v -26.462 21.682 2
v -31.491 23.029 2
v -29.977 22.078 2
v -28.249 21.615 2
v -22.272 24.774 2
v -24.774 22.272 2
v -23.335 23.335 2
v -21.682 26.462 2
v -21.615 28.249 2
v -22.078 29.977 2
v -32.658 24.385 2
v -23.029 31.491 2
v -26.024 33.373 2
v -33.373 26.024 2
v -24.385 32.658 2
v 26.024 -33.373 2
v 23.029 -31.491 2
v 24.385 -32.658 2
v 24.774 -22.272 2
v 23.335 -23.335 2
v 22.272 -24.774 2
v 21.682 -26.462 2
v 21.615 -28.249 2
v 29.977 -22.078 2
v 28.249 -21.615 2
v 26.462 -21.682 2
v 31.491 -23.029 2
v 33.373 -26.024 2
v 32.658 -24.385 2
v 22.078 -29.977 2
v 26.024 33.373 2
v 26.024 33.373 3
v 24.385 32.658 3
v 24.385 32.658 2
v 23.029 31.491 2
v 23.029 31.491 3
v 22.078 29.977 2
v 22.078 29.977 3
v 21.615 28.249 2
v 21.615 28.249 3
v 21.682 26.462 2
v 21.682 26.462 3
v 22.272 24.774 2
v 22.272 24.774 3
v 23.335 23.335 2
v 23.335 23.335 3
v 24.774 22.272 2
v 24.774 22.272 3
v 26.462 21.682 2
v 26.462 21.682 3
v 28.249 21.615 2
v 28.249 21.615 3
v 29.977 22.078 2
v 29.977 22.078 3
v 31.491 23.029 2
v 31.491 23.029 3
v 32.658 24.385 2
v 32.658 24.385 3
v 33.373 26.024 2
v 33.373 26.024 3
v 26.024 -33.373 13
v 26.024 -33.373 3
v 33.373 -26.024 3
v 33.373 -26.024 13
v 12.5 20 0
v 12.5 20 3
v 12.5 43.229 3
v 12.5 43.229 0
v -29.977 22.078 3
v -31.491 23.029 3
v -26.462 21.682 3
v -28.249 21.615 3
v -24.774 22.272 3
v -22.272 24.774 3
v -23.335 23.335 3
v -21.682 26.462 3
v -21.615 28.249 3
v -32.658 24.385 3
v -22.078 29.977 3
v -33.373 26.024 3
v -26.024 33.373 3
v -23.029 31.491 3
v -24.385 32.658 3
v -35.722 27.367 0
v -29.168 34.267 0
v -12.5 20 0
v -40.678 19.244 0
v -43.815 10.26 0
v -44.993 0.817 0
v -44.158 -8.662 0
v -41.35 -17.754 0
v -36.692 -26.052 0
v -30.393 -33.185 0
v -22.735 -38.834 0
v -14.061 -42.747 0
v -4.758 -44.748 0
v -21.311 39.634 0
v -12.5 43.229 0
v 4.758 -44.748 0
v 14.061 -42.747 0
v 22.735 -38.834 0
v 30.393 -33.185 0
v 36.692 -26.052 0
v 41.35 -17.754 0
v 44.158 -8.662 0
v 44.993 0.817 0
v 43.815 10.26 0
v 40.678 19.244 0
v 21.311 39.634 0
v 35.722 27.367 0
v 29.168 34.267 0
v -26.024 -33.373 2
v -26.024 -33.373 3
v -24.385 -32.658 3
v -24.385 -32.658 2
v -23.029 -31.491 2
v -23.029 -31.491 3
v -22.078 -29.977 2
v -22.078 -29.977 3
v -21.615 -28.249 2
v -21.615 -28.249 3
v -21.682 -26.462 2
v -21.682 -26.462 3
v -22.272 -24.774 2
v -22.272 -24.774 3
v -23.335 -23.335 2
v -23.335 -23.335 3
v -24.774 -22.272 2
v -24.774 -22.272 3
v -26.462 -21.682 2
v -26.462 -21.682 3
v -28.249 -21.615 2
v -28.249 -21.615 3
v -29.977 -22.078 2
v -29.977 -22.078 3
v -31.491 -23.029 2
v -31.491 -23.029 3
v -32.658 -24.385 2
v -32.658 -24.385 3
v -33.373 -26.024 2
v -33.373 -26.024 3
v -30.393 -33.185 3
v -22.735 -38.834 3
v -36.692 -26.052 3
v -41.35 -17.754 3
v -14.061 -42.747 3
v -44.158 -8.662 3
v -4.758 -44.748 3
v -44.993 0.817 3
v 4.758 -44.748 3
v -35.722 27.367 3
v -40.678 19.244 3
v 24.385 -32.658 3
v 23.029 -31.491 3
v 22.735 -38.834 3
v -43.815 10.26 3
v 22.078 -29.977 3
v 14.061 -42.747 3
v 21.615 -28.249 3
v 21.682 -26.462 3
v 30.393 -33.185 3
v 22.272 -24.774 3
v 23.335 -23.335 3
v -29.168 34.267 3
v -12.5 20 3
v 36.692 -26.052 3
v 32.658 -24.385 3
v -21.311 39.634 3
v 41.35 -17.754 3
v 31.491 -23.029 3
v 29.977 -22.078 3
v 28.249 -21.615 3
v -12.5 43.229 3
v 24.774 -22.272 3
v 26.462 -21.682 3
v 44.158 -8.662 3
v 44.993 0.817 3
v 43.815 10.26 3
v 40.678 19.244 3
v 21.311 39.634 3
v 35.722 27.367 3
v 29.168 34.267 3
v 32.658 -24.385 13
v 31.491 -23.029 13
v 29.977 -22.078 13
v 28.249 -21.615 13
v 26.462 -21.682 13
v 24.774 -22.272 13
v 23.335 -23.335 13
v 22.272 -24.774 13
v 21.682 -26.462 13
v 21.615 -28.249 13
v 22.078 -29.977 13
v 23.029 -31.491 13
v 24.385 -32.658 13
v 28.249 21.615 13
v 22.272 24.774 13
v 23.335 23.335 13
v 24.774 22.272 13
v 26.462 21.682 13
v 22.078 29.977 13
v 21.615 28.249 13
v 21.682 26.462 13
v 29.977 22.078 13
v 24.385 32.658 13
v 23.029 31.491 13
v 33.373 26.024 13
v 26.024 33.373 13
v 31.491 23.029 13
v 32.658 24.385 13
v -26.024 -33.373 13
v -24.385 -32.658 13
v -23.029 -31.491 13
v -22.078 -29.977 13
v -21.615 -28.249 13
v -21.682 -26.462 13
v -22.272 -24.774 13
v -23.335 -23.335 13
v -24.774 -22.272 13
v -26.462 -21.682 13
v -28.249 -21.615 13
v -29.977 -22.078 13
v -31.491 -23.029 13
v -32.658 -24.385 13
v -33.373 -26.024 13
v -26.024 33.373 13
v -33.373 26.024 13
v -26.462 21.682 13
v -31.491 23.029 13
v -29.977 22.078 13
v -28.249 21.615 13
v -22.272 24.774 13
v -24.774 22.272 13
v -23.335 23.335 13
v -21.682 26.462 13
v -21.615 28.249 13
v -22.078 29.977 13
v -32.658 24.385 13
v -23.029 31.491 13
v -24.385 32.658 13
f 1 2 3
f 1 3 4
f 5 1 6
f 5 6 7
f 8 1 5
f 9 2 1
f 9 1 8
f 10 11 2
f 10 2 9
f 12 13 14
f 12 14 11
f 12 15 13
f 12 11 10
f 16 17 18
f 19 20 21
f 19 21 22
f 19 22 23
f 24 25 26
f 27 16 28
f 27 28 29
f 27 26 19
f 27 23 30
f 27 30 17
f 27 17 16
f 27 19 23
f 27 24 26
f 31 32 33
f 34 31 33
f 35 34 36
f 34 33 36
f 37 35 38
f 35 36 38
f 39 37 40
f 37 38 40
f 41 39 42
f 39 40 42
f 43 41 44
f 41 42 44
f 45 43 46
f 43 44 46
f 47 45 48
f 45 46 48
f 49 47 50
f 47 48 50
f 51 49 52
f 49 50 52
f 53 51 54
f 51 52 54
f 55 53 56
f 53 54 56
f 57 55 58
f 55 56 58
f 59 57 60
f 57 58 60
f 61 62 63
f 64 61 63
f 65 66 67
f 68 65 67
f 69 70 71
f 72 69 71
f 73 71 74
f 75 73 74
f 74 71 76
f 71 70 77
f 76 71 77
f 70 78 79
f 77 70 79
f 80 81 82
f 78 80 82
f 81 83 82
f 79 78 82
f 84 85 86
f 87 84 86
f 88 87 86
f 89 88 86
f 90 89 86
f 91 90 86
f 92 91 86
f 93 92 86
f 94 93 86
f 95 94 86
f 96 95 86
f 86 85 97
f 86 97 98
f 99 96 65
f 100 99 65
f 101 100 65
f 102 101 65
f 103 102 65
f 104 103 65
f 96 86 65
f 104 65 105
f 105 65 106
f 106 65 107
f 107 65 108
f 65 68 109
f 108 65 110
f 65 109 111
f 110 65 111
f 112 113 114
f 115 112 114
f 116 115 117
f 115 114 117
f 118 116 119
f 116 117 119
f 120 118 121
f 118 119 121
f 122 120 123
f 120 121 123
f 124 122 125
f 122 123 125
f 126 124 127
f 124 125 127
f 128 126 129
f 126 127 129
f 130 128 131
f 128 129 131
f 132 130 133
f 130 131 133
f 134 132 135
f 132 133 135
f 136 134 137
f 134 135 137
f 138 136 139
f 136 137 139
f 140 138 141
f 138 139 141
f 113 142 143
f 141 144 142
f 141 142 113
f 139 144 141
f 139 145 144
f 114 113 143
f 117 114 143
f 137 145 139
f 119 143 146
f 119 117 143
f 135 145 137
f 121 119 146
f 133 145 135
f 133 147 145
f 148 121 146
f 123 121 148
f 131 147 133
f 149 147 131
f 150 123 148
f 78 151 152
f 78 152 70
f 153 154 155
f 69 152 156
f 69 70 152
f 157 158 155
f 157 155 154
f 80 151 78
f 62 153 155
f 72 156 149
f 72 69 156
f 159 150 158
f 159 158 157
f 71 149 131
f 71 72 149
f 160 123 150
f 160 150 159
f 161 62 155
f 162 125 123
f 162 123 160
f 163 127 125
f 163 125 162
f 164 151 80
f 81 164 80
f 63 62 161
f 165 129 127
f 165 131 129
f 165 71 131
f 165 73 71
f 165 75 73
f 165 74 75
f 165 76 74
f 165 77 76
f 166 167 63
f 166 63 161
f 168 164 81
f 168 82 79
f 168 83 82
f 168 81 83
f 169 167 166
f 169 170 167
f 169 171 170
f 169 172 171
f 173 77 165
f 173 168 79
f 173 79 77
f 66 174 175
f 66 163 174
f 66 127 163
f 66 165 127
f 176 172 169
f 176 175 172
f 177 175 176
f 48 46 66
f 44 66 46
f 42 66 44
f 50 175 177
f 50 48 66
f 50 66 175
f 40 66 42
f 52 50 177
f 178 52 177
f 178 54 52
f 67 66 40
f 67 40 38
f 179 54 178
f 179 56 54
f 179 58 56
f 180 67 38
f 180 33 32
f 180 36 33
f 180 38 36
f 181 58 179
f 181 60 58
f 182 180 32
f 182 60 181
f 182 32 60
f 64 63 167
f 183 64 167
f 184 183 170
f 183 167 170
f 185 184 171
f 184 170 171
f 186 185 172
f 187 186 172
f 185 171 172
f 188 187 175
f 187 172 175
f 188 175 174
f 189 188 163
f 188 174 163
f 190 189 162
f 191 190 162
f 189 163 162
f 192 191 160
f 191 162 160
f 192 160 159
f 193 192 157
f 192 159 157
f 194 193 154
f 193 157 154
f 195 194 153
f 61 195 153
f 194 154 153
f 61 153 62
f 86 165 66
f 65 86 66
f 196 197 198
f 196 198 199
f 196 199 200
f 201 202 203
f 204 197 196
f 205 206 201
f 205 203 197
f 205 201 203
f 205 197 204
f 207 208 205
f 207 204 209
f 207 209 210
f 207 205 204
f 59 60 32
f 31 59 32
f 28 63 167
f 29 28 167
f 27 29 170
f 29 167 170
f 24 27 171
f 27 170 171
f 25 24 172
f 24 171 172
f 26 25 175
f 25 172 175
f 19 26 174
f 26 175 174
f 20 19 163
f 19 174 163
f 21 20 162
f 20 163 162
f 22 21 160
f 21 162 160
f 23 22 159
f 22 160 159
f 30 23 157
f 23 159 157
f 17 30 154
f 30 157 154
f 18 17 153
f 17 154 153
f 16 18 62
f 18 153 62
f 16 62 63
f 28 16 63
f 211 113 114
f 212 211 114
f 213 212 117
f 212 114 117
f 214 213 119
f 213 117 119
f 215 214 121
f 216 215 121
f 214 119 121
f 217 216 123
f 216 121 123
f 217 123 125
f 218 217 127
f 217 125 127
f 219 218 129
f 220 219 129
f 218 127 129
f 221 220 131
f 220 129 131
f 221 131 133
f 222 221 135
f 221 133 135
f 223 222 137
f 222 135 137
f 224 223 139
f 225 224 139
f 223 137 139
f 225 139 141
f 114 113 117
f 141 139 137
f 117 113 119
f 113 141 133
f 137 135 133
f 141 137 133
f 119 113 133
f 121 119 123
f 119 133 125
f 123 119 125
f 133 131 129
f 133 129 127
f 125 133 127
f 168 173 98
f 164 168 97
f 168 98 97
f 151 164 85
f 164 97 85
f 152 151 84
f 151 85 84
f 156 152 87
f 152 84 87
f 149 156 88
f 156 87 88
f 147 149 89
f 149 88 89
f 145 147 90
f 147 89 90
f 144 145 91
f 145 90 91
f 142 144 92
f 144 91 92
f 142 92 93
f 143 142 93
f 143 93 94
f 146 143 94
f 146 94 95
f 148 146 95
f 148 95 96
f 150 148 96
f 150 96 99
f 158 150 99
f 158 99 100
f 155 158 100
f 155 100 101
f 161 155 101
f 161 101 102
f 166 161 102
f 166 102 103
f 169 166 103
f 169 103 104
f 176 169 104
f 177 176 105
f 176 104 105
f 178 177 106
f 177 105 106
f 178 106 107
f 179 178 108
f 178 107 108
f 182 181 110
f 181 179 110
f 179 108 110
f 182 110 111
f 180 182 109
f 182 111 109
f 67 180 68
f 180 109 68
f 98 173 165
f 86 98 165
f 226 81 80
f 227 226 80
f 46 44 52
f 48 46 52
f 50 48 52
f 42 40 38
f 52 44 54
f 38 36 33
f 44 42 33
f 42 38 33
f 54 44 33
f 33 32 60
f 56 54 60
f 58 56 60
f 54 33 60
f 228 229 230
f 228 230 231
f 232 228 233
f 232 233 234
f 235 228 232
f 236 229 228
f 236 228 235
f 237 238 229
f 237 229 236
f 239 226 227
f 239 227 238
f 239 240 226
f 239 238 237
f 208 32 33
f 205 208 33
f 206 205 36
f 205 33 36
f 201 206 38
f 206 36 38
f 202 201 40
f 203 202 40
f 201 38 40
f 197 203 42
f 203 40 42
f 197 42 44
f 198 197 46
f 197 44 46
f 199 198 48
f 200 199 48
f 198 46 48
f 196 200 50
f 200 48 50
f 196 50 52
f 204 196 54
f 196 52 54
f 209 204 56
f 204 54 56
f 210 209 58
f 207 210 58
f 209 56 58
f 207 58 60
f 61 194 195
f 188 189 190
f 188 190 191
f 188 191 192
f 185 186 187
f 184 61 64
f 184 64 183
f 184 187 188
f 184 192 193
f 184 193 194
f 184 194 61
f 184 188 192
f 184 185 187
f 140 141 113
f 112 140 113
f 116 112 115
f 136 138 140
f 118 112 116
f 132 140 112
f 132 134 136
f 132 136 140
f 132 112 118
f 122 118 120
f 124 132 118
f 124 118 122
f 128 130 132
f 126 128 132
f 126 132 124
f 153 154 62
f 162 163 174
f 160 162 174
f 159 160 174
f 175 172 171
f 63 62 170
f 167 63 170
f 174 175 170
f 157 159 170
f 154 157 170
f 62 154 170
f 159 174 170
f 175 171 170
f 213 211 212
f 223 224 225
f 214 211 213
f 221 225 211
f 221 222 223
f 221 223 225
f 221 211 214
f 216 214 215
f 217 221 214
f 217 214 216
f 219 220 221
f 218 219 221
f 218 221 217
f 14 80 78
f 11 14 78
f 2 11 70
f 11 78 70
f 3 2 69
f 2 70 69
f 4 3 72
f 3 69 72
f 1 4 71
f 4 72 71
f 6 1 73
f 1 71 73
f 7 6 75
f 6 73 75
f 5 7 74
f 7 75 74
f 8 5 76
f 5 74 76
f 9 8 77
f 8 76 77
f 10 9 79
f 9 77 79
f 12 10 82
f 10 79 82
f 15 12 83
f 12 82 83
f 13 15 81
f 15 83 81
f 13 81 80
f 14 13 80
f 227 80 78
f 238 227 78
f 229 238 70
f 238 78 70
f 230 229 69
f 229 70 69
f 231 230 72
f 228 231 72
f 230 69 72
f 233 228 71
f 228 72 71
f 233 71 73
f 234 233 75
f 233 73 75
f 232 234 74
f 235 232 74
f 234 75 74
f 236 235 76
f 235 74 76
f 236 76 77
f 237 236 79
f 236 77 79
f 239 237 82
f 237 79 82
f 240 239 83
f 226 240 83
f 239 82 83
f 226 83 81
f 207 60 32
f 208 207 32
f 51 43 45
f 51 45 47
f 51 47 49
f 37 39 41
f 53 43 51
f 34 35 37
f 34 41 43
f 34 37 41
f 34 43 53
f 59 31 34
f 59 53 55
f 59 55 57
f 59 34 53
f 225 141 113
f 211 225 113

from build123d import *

# Parameters (mm, degrees)
F0_R     = 45
F1_DEPTH = 3
F3_DEPTH = 25
F4_DEPTH = 10
F5_DEPTH = 1


with BuildPart() as f1:
    # F0 (on Top) → F1 (new body)
    with BuildSketch(Plane.XY):
        Circle(F0_R)
    extrude(amount=F1_DEPTH)

    # F2 (on face) → F3 (cut)
    with BuildSketch(Plane.XY.offset(3)):
        with BuildLine():
            Line((12.5, 70), (-12.5, 70))
            Line((-12.5, 70), (-12.5, 43.229041))
            ThreePointArc((-12.5, 43.229041), (0, 45), (12.5, 43.229041))
            Line((12.5, 43.229041), (12.5, 70))
        make_face()
        with BuildLine():
            ThreePointArc((12.5, 43.229041), (0, 45), (-12.5, 43.229041))
            Line((-12.5, 43.229041), (-12.5, 20))
            Line((-12.5, 20), (12.5, 20))
            Line((12.5, 20), (12.5, 43.229041))
        make_face()
    extrude(amount=-F3_DEPTH, mode=Mode.SUBTRACT)

    # F2 (on face) → F5 (cut)
    with BuildSketch(Plane.XY.offset(3)):
        with BuildLine():
            Line((-26.02425, 33.372719), (-33.372719, 26.02425))
            ThreePointArc((-33.372719, 26.02425), (-23.334524, 23.334524), (-26.02425, 33.372719))
        make_face()
        with BuildLine():
            Line((-33.372719, -26.02425), (-26.02425, -33.372719))
            ThreePointArc((-26.02425, -33.372719), (-23.334524, -23.334524), (-33.372719, -26.02425))
        make_face()
        with BuildLine():
            Line((26.02425, -33.372719), (33.372719, -26.02425))
            ThreePointArc((33.372719, -26.02425), (23.334524, -23.334524), (26.02425, -33.372719))
        make_face()
        with BuildLine():
            Line((33.372719, 26.02425), (26.02425, 33.372719))
            ThreePointArc((26.02425, 33.372719), (23.334524, 23.334524), (33.372719, 26.02425))
        make_face()
    extrude(amount=-F5_DEPTH, mode=Mode.SUBTRACT)


with BuildPart() as f4:
    # F2 (on face) → F4 (new body)
    with BuildSketch(Plane.XY.offset(3)):
        with BuildLine():
            Line((-26.02425, 33.372719), (-33.372719, 26.02425))
            ThreePointArc((-33.372719, 26.02425), (-23.334524, 23.334524), (-26.02425, 33.372719))
        make_face()
        with BuildLine():
            Line((33.372719, 26.02425), (26.02425, 33.372719))
            ThreePointArc((26.02425, 33.372719), (23.334524, 23.334524), (33.372719, 26.02425))
        make_face()
        with BuildLine():
            Line((-33.372719, -26.02425), (-26.02425, -33.372719))
            ThreePointArc((-26.02425, -33.372719), (-23.334524, -23.334524), (-33.372719, -26.02425))
        make_face()
        with BuildLine():
            Line((26.02425, -33.372719), (33.372719, -26.02425))
            ThreePointArc((33.372719, -26.02425), (23.334524, -23.334524), (26.02425, -33.372719))
        make_face()
    extrude(amount=F4_DEPTH)


solid = Compound([f1.part, f4.part])
